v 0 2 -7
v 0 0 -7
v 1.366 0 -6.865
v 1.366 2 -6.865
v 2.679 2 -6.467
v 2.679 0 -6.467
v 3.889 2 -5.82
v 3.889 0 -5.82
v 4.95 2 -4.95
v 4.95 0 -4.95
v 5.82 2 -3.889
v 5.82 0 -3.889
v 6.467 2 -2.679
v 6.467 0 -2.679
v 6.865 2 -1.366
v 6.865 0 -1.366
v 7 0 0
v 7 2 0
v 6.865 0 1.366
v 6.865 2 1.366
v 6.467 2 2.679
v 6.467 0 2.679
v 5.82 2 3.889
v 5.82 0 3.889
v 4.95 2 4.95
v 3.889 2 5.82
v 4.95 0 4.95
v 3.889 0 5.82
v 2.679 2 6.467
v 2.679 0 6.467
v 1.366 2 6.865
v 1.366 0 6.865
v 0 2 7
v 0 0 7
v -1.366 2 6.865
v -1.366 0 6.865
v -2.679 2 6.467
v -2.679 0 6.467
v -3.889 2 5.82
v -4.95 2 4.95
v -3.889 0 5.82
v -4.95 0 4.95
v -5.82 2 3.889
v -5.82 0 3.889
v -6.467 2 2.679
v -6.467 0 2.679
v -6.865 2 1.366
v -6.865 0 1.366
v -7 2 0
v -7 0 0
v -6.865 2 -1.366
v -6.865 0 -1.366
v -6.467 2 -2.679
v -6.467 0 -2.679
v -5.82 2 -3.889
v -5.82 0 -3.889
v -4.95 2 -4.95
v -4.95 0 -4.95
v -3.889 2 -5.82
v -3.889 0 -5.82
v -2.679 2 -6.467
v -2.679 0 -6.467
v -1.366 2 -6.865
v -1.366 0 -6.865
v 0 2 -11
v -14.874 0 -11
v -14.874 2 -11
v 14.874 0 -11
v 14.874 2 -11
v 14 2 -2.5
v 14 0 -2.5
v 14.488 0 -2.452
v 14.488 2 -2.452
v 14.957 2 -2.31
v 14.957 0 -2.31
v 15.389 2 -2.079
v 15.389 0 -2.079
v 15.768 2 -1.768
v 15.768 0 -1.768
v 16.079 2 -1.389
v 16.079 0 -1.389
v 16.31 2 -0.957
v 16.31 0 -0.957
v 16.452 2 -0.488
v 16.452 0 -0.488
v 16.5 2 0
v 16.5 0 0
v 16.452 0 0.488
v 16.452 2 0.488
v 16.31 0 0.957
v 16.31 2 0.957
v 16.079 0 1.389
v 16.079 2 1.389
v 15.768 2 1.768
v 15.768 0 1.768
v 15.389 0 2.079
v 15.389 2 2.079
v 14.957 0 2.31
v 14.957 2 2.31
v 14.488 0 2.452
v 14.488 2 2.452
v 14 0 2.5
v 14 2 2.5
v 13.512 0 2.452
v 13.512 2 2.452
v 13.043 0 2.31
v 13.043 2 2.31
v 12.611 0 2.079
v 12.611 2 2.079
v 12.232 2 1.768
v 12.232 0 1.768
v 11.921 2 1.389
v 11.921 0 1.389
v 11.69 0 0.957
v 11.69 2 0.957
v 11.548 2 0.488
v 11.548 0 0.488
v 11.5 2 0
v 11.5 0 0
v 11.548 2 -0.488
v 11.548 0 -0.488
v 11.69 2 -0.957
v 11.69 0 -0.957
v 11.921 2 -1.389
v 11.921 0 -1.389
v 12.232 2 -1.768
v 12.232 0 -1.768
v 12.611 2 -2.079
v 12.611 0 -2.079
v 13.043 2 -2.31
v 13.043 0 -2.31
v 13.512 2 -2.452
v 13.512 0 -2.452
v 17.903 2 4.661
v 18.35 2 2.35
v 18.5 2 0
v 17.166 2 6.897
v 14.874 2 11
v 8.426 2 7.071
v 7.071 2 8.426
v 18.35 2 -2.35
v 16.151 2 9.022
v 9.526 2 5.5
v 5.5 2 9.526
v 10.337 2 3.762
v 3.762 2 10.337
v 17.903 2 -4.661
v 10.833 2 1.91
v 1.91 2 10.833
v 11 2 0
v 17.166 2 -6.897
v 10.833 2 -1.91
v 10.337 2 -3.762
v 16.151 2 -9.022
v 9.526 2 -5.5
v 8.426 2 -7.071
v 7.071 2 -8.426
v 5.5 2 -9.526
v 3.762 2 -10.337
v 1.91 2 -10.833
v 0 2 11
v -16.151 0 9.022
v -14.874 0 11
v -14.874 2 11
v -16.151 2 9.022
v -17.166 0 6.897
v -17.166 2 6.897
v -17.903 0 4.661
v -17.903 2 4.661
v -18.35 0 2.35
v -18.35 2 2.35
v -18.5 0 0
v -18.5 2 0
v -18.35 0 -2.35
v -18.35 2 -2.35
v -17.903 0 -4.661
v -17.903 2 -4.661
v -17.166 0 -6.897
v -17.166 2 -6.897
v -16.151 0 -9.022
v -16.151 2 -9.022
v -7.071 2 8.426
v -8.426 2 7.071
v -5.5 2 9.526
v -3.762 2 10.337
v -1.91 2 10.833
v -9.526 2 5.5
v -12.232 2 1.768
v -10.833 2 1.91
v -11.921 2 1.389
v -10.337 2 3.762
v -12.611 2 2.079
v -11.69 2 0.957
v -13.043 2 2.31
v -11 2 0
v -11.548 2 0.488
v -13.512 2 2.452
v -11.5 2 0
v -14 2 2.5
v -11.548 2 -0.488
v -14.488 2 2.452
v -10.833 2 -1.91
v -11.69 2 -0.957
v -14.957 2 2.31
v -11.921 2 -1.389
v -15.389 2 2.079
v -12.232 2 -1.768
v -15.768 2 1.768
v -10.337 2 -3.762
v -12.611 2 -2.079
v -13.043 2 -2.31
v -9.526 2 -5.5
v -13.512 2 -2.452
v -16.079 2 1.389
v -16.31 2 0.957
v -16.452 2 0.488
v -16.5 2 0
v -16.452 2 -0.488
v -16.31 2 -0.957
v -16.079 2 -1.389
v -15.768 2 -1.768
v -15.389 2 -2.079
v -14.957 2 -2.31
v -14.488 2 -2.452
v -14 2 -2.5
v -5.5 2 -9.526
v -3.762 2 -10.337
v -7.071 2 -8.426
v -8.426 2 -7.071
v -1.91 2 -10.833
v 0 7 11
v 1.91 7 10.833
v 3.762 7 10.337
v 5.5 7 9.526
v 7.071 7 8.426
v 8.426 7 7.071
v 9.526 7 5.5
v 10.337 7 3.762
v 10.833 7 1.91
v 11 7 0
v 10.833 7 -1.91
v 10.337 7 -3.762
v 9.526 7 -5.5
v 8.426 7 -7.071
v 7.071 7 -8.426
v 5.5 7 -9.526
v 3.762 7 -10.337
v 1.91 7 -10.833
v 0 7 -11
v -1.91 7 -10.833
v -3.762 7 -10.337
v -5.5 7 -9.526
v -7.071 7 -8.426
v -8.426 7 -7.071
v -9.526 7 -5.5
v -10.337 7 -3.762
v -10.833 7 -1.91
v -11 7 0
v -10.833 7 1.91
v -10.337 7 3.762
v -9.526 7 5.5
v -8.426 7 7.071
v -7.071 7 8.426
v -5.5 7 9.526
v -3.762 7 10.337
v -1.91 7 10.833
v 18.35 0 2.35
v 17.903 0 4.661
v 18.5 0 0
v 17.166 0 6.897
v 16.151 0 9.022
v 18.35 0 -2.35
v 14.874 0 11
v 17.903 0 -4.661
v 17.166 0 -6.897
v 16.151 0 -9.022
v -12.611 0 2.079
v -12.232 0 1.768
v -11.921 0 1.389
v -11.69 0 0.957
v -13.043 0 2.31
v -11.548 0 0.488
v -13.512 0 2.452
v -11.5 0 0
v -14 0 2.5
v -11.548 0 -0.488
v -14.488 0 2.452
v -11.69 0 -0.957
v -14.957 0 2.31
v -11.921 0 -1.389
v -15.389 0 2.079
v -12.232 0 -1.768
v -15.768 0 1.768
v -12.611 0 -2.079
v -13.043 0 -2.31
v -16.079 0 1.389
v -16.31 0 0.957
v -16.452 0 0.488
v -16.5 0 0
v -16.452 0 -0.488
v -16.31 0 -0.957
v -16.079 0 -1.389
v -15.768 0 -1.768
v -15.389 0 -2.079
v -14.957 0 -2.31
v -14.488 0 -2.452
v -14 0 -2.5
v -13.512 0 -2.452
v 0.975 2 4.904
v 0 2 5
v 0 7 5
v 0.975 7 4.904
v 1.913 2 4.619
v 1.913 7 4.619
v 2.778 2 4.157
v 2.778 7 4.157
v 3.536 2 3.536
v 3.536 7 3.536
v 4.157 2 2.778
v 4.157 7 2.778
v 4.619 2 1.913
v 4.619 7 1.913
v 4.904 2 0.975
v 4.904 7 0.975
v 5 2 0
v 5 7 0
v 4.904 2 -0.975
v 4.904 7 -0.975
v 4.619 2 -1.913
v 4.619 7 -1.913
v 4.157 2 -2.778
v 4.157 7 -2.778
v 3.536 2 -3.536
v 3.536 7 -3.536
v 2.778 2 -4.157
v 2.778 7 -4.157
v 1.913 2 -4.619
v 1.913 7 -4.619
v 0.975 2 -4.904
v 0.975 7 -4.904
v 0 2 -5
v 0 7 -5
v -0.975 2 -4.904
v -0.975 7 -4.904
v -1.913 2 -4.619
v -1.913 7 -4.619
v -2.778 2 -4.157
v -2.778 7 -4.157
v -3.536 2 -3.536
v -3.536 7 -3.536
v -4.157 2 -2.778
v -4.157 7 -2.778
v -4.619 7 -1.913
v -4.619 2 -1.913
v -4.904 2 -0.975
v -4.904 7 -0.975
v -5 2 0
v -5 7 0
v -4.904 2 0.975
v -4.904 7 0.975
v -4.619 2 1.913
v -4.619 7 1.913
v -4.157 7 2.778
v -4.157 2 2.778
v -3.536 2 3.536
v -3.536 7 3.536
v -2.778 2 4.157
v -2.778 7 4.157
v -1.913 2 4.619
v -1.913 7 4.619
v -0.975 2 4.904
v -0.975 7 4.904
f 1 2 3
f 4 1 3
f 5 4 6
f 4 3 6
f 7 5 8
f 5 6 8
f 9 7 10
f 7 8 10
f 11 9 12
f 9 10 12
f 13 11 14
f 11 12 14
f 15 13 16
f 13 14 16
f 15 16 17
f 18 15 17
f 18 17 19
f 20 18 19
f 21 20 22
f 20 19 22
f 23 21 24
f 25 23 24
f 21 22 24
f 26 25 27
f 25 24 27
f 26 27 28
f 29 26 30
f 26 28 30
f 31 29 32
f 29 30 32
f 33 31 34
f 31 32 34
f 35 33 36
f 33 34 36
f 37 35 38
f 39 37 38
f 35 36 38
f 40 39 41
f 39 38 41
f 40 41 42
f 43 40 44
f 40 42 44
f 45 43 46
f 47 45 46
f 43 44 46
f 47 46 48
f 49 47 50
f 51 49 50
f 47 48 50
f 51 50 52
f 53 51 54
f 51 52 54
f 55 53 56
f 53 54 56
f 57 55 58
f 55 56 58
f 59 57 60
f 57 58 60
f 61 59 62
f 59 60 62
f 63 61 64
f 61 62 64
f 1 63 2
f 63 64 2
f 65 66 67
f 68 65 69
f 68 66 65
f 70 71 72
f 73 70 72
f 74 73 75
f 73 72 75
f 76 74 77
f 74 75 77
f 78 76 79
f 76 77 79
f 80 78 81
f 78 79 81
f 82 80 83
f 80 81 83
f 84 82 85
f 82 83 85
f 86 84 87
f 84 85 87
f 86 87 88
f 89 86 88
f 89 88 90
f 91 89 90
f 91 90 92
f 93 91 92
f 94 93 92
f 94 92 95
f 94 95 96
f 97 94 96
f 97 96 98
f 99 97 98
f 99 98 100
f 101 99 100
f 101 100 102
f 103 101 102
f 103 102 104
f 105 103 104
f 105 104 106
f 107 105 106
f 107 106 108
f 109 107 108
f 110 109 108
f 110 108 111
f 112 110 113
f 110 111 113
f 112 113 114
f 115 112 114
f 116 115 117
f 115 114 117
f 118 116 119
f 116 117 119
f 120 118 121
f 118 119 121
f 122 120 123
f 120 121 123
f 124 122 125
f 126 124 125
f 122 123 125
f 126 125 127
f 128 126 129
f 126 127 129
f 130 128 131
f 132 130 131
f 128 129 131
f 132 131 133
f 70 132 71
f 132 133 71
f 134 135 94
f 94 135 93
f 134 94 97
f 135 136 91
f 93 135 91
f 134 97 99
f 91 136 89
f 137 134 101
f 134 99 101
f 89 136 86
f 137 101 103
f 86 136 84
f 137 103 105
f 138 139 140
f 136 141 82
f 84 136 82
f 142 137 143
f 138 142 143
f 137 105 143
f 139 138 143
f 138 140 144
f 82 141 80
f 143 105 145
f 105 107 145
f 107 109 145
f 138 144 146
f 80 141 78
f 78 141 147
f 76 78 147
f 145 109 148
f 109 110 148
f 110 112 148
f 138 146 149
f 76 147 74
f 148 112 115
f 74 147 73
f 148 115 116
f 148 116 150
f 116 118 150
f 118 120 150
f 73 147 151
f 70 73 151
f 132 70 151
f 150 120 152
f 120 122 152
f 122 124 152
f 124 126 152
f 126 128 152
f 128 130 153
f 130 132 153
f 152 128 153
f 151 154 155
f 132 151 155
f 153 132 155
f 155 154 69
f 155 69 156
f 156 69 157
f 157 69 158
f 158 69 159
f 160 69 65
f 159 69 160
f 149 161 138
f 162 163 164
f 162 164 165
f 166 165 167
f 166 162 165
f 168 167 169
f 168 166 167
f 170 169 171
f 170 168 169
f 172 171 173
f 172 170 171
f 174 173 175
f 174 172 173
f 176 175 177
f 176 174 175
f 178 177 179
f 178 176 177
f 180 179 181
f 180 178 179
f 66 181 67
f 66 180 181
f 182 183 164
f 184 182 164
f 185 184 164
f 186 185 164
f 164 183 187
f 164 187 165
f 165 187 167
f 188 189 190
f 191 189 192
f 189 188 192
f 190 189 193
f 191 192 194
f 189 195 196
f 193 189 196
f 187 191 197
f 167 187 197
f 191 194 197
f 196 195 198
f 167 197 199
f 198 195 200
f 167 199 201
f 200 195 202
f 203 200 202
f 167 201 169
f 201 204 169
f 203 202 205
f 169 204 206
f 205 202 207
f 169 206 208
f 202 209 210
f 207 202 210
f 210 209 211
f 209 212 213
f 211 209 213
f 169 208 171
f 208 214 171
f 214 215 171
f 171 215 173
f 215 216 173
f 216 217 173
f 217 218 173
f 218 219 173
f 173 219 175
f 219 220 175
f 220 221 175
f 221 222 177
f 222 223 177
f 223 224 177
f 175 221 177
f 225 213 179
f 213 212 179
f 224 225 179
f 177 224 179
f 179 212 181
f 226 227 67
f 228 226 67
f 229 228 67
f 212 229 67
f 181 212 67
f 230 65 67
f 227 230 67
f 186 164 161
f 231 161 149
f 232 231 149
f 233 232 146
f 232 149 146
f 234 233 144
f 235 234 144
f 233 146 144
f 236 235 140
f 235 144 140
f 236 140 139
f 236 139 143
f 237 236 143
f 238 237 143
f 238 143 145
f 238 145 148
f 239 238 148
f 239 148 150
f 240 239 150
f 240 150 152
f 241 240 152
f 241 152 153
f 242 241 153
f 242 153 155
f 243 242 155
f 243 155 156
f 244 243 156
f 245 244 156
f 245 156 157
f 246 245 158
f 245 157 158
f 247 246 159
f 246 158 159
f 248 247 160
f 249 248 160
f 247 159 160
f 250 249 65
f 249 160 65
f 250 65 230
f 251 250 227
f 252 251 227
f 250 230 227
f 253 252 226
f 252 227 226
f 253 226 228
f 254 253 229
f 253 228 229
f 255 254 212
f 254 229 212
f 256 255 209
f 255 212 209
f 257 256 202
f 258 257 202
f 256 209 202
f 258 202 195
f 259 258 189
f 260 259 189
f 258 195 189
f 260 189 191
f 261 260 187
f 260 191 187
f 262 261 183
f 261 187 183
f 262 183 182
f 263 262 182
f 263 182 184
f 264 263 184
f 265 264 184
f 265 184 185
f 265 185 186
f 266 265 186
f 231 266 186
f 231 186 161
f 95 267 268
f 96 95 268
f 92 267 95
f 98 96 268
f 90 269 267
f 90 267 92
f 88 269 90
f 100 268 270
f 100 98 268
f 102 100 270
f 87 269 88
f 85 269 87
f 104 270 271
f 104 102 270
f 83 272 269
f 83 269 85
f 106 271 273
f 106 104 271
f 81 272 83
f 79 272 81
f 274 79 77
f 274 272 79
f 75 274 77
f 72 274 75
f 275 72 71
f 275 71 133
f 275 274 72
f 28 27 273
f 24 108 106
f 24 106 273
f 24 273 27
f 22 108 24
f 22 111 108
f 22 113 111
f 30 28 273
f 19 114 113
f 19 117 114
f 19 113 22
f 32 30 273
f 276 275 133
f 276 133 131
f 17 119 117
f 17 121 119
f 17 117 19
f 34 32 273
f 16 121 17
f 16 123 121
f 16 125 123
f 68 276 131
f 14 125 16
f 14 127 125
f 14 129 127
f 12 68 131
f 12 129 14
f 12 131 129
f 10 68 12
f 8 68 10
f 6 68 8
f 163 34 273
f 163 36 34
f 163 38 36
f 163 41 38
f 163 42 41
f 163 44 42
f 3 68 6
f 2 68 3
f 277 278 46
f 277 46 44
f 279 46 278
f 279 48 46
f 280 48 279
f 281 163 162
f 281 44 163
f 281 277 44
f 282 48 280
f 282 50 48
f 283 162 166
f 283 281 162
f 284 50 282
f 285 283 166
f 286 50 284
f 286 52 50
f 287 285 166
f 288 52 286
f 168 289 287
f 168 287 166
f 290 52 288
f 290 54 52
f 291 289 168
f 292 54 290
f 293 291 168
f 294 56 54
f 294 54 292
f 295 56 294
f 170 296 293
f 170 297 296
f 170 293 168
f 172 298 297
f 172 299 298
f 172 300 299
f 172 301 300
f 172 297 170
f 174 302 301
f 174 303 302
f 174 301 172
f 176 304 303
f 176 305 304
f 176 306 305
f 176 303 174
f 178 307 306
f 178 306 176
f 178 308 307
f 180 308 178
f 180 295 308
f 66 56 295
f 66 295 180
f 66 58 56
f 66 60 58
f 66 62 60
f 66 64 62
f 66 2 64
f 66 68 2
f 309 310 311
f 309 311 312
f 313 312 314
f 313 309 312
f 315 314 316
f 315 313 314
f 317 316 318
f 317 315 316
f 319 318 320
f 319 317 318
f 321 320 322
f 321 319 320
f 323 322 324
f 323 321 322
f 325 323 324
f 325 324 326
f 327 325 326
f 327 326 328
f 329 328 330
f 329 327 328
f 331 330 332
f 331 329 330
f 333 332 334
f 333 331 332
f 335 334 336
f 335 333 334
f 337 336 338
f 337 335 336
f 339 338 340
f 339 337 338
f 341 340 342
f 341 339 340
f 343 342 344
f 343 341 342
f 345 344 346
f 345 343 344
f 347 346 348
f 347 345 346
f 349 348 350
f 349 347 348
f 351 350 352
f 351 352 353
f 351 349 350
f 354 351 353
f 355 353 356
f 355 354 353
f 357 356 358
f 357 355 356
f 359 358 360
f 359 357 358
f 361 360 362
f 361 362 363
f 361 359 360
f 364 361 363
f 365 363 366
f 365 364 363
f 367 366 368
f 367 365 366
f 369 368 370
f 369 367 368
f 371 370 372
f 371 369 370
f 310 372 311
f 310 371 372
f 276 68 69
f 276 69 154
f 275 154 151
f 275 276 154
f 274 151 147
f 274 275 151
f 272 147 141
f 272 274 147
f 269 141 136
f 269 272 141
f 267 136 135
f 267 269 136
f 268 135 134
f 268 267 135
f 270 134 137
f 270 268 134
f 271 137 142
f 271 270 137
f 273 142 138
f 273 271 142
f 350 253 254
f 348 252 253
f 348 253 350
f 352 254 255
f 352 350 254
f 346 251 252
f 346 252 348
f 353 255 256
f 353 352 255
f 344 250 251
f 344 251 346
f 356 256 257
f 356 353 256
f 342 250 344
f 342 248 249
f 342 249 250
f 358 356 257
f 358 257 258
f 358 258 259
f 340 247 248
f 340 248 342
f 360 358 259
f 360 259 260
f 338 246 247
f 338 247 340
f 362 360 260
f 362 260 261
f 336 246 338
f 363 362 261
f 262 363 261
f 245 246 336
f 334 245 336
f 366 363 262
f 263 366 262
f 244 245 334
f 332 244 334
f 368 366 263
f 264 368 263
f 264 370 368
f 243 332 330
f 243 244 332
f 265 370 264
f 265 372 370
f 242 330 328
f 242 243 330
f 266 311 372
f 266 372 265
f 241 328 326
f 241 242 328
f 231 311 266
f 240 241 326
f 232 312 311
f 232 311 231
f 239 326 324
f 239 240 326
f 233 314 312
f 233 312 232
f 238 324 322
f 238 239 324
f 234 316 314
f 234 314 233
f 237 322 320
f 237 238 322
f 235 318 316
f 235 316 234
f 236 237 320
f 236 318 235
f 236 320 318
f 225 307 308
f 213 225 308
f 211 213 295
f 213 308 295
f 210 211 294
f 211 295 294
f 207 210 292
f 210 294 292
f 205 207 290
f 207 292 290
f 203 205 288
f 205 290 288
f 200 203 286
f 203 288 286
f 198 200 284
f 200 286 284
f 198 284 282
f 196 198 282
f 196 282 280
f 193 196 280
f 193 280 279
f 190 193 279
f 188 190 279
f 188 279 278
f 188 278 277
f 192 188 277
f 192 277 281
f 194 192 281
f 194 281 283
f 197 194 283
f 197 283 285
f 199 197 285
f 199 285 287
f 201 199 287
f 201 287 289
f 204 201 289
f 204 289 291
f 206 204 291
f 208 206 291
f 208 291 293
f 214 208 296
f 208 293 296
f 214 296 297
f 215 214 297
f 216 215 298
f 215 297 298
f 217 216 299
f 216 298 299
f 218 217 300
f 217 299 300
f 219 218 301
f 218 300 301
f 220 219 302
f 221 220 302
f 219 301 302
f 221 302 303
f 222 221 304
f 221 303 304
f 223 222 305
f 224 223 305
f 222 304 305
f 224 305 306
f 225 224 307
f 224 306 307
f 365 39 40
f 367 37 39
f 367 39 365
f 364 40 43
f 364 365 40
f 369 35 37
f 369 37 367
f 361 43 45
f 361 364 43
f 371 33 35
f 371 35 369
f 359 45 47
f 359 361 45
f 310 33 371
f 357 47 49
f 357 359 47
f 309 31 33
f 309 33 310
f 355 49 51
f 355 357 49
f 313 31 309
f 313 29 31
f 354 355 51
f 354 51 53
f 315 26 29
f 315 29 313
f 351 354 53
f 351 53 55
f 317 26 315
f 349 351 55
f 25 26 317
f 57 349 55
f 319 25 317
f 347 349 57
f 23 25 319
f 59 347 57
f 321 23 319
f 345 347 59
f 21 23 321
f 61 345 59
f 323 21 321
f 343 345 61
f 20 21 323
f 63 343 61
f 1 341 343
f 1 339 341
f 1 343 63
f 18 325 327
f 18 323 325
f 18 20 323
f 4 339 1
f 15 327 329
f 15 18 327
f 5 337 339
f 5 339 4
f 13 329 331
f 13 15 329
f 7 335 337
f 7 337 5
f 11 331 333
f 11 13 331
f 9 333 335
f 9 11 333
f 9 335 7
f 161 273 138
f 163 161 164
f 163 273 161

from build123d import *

# Parameters (mm, degrees)
SKETCH_1_R          = 5
EXTRUDE_1_DEPTH     = 2
SKETCH_2_R          = 11
SKETCH_2_R_2        = 5
EXTRUDE_2_DEPTH     = 5
SKETCH_3_R          = 2.5
CUT_EXTRUDE_1_DEPTH = 23.632940596
SKETCH_4_R          = 7
CUT_EXTRUDE_2_DEPTH = 2


with BuildPart() as part:
    # 草图1 → 凸台-拉伸1 (new body)
    with BuildSketch(Plane(origin=(0, 0, 0), x_dir=(1, 0, 0), z_dir=(0, 1, 0))):
        with BuildLine():
            Line((-14.874474781, 11), (14.874474781, 11))
            ThreePointArc((14.874474781, 11), (18.5, 0), (14.874474781, -11))
            Line((14.874474781, -11), (-14.874474781, -11))
            ThreePointArc((-14.874474781, -11), (-18.5, 0), (-14.874474781, 11))
        make_face()
        with Locations(Location((0, 0, 0), (0, 0, 270))):
            Circle(SKETCH_1_R, mode=Mode.SUBTRACT)
    extrude(amount=EXTRUDE_1_DEPTH)

    # 草图2 → 凸台-拉伸2 (add)
    with BuildSketch(Plane(origin=(0, 2, 0), x_dir=(1, 0, 0), z_dir=(0, 1, 0))):
        with Locations(Location((0, 0, 0), (0, 0, 270))):
            Circle(SKETCH_2_R)
        with Locations(Location((0, 0, 0), (0, 0, 270))):
            Circle(SKETCH_2_R_2, mode=Mode.SUBTRACT)
    extrude(amount=EXTRUDE_2_DEPTH)

    # 草图3 → 切除-拉伸1 (cut, through all)
    with BuildSketch(Plane.XZ):
        with Locations(Location((-14, 0, 0), (0, 0, 270))):
            Circle(SKETCH_3_R)
        with Locations(Location((14, 0, 0), (0, 0, 270))):
            Circle(SKETCH_3_R)
    extrude(amount=-CUT_EXTRUDE_1_DEPTH, mode=Mode.SUBTRACT)

    # 草图4 → 切除-拉伸2 (cut)
    with BuildSketch(Plane.XZ):
        with Locations(Location((0, 0, 0), (0, 0, 270))):
            Circle(SKETCH_4_R)
    extrude(amount=-CUT_EXTRUDE_2_DEPTH, mode=Mode.SUBTRACT)


solid = part.part
